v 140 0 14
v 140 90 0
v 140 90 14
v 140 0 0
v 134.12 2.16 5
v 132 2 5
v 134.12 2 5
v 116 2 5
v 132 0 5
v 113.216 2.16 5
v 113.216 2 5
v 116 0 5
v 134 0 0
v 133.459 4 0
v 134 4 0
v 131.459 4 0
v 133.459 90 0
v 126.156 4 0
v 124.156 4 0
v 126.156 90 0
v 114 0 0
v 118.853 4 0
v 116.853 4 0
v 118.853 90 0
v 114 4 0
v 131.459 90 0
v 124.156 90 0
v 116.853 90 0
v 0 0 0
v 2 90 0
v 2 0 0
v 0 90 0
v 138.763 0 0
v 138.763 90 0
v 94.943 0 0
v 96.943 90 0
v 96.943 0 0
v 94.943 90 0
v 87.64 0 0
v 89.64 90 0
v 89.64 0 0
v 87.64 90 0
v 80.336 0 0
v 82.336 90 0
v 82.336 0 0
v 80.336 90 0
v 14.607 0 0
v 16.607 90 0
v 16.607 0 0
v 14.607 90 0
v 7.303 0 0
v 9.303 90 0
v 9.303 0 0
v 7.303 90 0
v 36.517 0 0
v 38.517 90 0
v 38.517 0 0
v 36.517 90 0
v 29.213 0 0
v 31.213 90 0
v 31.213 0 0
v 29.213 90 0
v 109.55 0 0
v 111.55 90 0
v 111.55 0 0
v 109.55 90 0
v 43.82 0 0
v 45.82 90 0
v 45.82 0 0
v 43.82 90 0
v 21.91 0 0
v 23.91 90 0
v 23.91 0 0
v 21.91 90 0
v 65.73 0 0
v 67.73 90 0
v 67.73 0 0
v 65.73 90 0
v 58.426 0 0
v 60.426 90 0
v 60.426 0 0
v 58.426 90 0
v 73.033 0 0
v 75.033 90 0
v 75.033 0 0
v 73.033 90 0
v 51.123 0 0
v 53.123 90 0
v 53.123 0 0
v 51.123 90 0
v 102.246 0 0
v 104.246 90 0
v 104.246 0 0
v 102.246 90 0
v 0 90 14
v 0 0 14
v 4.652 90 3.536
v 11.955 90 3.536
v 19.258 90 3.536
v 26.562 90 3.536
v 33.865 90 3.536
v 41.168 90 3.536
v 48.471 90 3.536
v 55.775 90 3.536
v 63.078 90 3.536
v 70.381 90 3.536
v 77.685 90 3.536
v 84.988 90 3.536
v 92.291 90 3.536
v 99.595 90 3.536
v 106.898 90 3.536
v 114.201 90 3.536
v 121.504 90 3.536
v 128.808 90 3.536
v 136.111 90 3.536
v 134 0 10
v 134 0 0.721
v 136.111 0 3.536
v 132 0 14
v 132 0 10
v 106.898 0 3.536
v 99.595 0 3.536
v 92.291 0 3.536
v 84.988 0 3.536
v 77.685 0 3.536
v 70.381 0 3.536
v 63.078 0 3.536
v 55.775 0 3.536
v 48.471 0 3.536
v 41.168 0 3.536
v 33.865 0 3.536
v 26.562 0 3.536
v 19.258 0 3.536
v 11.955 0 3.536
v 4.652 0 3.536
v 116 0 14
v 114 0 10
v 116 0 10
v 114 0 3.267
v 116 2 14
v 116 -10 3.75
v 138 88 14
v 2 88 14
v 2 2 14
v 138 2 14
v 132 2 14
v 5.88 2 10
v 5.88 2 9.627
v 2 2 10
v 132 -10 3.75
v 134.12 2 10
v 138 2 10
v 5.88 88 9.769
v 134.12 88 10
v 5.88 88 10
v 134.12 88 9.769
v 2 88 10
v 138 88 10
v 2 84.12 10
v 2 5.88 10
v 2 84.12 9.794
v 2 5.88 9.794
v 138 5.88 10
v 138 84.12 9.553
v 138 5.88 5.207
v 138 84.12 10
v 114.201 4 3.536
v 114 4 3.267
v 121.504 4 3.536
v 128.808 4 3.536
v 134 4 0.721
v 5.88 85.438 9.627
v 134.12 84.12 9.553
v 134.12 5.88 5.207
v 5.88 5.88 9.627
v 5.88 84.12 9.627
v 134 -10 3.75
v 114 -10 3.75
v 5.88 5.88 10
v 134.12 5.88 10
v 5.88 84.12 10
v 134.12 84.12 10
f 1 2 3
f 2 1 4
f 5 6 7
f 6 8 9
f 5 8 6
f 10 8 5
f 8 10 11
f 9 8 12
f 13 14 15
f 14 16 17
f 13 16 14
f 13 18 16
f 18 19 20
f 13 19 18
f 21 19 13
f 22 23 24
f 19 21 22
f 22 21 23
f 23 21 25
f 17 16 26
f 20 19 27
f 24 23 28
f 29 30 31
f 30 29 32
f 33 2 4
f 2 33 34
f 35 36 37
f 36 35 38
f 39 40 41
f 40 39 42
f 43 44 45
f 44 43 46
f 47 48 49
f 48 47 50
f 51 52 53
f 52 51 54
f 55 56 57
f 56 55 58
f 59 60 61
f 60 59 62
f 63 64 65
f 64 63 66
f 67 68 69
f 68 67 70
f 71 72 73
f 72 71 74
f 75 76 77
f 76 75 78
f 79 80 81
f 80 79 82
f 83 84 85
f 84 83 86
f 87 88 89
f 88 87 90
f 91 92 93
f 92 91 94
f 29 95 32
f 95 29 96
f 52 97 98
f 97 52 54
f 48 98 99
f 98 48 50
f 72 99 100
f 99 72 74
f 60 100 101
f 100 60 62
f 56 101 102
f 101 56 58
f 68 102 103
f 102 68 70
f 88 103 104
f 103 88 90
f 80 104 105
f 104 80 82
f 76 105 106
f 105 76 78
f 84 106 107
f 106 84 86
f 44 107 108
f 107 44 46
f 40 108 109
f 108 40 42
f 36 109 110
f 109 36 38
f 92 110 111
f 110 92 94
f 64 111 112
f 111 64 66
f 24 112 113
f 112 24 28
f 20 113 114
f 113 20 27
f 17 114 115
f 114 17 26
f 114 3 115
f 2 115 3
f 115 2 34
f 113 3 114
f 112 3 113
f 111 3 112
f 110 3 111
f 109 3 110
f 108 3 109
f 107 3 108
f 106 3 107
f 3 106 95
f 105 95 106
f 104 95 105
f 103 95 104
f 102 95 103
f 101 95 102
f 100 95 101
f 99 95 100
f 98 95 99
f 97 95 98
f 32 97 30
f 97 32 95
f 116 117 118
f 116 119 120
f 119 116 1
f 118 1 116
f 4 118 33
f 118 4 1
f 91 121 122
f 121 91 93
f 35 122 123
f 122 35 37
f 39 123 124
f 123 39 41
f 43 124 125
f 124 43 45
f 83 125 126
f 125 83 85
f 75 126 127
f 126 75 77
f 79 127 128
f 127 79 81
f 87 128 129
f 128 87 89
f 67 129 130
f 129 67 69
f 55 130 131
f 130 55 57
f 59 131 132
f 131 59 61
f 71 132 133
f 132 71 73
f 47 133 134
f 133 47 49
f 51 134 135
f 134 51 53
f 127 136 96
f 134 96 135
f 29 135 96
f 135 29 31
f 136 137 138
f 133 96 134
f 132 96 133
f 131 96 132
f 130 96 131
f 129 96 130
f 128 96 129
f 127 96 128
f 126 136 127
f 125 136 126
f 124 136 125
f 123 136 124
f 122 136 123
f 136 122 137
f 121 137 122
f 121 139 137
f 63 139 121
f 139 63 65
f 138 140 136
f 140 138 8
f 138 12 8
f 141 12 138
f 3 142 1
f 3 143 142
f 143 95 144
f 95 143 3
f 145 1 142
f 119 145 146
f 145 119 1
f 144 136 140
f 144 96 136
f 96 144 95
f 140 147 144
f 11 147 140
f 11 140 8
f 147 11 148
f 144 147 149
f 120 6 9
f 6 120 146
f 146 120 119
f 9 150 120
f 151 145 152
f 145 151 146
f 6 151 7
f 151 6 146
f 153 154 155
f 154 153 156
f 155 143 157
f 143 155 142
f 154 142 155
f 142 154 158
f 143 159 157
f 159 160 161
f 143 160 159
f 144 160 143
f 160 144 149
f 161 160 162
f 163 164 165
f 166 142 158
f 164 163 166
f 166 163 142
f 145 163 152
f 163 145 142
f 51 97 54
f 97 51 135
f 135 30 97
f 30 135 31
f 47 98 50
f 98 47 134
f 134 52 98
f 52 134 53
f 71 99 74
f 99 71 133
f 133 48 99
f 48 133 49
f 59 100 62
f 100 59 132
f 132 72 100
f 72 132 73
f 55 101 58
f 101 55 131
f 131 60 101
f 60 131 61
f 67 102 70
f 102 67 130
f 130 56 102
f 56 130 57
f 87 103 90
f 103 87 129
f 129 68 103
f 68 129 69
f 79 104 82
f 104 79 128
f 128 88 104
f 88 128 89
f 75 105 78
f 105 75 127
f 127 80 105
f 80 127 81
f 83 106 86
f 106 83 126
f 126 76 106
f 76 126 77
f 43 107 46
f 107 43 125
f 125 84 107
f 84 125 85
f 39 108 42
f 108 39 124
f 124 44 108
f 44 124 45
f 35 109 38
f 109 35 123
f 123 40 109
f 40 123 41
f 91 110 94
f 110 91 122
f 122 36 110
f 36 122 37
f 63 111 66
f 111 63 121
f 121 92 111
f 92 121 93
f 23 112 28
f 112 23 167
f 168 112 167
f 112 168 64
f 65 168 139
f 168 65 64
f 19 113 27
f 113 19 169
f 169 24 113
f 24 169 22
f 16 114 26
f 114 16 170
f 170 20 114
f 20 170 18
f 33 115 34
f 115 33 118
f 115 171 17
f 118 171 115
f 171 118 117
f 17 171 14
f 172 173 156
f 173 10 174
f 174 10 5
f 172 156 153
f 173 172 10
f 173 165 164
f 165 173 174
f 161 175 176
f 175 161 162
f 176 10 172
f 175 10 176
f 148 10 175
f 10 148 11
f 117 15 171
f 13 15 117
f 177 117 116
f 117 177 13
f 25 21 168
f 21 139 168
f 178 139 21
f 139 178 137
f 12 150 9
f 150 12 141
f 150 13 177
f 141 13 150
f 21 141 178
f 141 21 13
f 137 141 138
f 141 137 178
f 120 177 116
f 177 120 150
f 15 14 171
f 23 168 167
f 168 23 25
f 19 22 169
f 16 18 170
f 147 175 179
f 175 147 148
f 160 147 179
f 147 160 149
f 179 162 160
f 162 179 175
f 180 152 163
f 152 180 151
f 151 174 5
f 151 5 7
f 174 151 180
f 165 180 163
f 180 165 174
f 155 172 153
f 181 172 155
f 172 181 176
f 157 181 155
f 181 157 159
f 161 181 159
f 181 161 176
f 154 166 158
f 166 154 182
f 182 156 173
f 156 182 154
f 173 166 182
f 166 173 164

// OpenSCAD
// file: library.scad
module ccube(width, depth, height, center_z = false, corner_cut = 0) {
	if (center_z) {
		translate([-width / 2, -depth / 2, -height / 2]) {
			difference () {
				cube([width, depth, height]);
			}
			
			children();
		}
	} else {
		translate([-width / 2, -depth / 2, 0]) {
			difference () {
				cube([width, depth, height]);
				
				if (corner_cut > 0) {
					//translate([width / 2, height / 2, 0])
					rotate([0, 0, 45])
					ccube(corner_cut, corner_cut, height);

					translate([width, 0, 0])
					rotate([0, 0, 45])
					ccube(corner_cut, corner_cut, height);
					
					translate([width, depth, 0])
					rotate([0, 0, 45])
					ccube(corner_cut, corner_cut, height);

					translate([0, depth, 0])
					rotate([0, 0, 45])
					ccube(corner_cut, corner_cut, height);
				}
			}
			
			children();
		}
	}
}


module ring(radius, width, height) {
	difference () {
		cylinder(r = radius, h = height);
		cylinder(r = radius - width, h = height);
	}
}


module hexagon(side, height) {
	h = sqrt(3) * side;
	
	for (i = [0 : 5]) {
		rotate([0, 0, i * 60])
		translate([-side / 2, -h / 2, 0])
		cube([side, h, height]);
	}
}


module ramp(width, depth, height) {
    angle = atan(height / depth);
    
    difference () {
        cube([width, depth, height]);
    
        //color("red")
        rotate([angle, 0, 0])
        translate([-1, 0, 0])
        cube([width + 2, depth * 2, height]);
    }
}


module round_inner_corner(width, depth) {
	difference() {
		cube([width, depth, width]);
		
		translate([width, 3 * depth / 2, width])
		rotate([90, 0, 0])
		cylinder(r = width, h = depth * 2);
	}
}


module slide_clip(width,
                  depth,
                  height,
                  wall,
                  inner = false,
                  slack = 0) {
    difference () {
        union () {
            if (inner) {
                translate([-wall / 2, 0, 0])
                cube([wall, depth, height - wall]);
                
                translate([-width / 2, depth - wall, 0])
                cube([width, wall, height - wall]);
                
                //translate([-width / 2, 0, height - wall])
                //cube([width, depth, wall]);
            } else {    
                translate([-wall / 2, 0, 0])
                cube([wall, depth, height]);
                
                translate([-width / 2, depth - wall, 0])
                cube([width, wall, height]);
                
                translate([-width / 2, 0, height - wall])
                cube([width, depth, wall]);
            }
        }
        
        if (!inner) {
            translate([wall / 2, depth - wall, 0])
            rotate([0, 30, 0])
            cube([width, wall, height]);
            
            translate([-wall / 2, depth - wall, 0])
            rotate([0, -30, 0])
            translate([-width, 0, 0])
            cube([width, wall, height]);
            
            translate([0, depth - wall / 2, 0])
            rotate([-30, 0, 0])
            translate([-width / 2, 0, 0])
            cube([width, wall, height]);
        }
    }
}


/*
slide_clip(6, 6, 50, 2);

translate([20, 0, 0])
slide_clip(6, 6, 50, 2, true, slack = 0.5);
*/


// ramp(100, 50, 20);
// main file
use <library.scad>


wall = 2;
width = 140;
depth = 90;
floor_height = 5;

ramp_height = 5;
drain_width = 20;
drain_length = 10;

bottom_wall_height = floor_height + ramp_height + 2 * wall;

inner_width = width - wall * 2;
inner_depth = depth - wall * 2;

rack_leg_height = 20;
grid_spacing = 10;
clearance = 0.120;

module bottom() {
    tunnel_width_scale = 0.75;
    tunnel_width = sqrt(2 * floor_height * floor_height) * tunnel_width_scale;
    tunnel_count = floor((width - wall) / (tunnel_width + wall));
    
    difference () {
        union () {
            // FLOOR
            cube([width, depth, floor_height]);
            
            // WALLS    
            cube([width - wall * 2 - drain_width, wall, bottom_wall_height]);
            
            translate([inner_width - wall * 2, 0, 0])
            cube([wall * 4, wall, bottom_wall_height]);
            
            translate([0, depth - wall, 0])
            cube([width, wall, bottom_wall_height]);
            
            cube([wall, depth, bottom_wall_height]);
            
            translate([width - wall, 0, 0])
            cube([wall, depth, bottom_wall_height]);
        }
    
        //translate([-width, 0, 0])
        for (i = [0 : (tunnel_count )]) {
            translate([wall + (tunnel_width / 2) + i * (tunnel_width + wall), 0, 0])
            scale([tunnel_width_scale, 1, 1])
            rotate([0, 45, 0])
            translate([-floor_height / 2, 0, -floor_height / 2])
            cube([floor_height, depth, floor_height]);
        }
    }
    
    // RAMPS
    translate([0, 0, floor_height -  clearance])
    ramp(width, depth, ramp_height);

    translate([width - drain_width - 2 * wall, wall, floor_height - clearance])
    rotate([0, 0, 90])
    ramp(depth - 2 * wall, width - drain_width - 2 * wall, ramp_height);
    
    
    
    // DRAIN
    translate([width - wall * 3- drain_width,
               -drain_length,
               3 * floor_height / 4])
    ramp(drain_width, drain_length, floor_height / 4);
    
    translate([width - wall * 3,
               -drain_length,
               3 * floor_height / 4])
    rotate([0, 180, 0])
    ramp(drain_width, drain_length, 3 * floor_height / 4);
    
    translate([width - drain_width - 3 * wall,
               -drain_length,
               3 * floor_height / 4])
    ramp(wall, drain_length, ramp_height + floor_height / 4);
    
    translate([width - 4 * wall,
               -drain_length,
               3 * floor_height / 4])
    //cube([wall, drain_length + wall, ramp_height]);
    ramp(wall, drain_length, ramp_height + floor_height / 4);
    
    translate([width - drain_width - 3 * wall, 0, 0])
    cube([drain_width, 2 * wall, floor_height]);
    
    
    // RACK STANDS
    color("red")
    translate([wall - clearance, wall - clearance, floor_height])
    cube([wall * 2, wall * 2, floor_height + ramp_height - floor_height ]);
    
    color("red")
    translate([width - wall * 3 + clearance, wall - clearance, floor_height])
    cube([wall * 2, wall * 2, floor_height + ramp_height - floor_height ]);
    
    color("red")
    translate([wall - clearance, depth - wall * 3 + clearance, floor_height])
    cube([wall * 2, wall * 2, floor_height + ramp_height - floor_height ]);
    
    color("red")
    translate([width - wall * 3 + clearance, depth - wall * 3 + clearance, floor_height])
    cube([wall * 2, wall * 2, floor_height + ramp_height - floor_height ]);
}


module rack() {
    // LEGS
    translate([wall, wall, 0])
    cube([wall * 2, wall * 2, rack_leg_height + wall]);
    
    translate([inner_width - wall, wall, 0])
    cube([wall * 2, wall * 2, rack_leg_height + wall]);
    
    translate([inner_width - wall, inner_depth - wall, 0])
    cube([wall * 2, wall * 2, rack_leg_height + wall]);
    
    translate([wall, inner_depth - wall, 0])
    cube([wall * 2, wall * 2, rack_leg_height + wall]);
    
    
    // FRAME
    translate([0, 0, rack_leg_height])
    cube([width, wall, wall]);
    
    translate([0, depth - wall, rack_leg_height])
    cube([width, wall, wall]);
    
    translate([0, 0, rack_leg_height])
    cube([wall, depth, wall]);
    
    translate([width - wall, 0, rack_leg_height])
    cube([wall, depth, wall]);
    
    
    // GRID
    x_count = inner_width / grid_spacing;
    y_count = inner_depth / (grid_spacing * 2);
    
    for (i = [1 : x_count]) {
        translate([i * grid_spacing, 0, rack_leg_height])
        cube([wall, depth, wall]);
    }
    
    for (i = [1 : y_count]) {
        translate([0, i * grid_spacing * 2, rack_leg_height])
        cube([width, wall, wall]);
    }
}


bottom();

//rotate([180,0,0])
//color("green")
//translate([0, 0, floor_height + ramp_height + 10])
//rack();
